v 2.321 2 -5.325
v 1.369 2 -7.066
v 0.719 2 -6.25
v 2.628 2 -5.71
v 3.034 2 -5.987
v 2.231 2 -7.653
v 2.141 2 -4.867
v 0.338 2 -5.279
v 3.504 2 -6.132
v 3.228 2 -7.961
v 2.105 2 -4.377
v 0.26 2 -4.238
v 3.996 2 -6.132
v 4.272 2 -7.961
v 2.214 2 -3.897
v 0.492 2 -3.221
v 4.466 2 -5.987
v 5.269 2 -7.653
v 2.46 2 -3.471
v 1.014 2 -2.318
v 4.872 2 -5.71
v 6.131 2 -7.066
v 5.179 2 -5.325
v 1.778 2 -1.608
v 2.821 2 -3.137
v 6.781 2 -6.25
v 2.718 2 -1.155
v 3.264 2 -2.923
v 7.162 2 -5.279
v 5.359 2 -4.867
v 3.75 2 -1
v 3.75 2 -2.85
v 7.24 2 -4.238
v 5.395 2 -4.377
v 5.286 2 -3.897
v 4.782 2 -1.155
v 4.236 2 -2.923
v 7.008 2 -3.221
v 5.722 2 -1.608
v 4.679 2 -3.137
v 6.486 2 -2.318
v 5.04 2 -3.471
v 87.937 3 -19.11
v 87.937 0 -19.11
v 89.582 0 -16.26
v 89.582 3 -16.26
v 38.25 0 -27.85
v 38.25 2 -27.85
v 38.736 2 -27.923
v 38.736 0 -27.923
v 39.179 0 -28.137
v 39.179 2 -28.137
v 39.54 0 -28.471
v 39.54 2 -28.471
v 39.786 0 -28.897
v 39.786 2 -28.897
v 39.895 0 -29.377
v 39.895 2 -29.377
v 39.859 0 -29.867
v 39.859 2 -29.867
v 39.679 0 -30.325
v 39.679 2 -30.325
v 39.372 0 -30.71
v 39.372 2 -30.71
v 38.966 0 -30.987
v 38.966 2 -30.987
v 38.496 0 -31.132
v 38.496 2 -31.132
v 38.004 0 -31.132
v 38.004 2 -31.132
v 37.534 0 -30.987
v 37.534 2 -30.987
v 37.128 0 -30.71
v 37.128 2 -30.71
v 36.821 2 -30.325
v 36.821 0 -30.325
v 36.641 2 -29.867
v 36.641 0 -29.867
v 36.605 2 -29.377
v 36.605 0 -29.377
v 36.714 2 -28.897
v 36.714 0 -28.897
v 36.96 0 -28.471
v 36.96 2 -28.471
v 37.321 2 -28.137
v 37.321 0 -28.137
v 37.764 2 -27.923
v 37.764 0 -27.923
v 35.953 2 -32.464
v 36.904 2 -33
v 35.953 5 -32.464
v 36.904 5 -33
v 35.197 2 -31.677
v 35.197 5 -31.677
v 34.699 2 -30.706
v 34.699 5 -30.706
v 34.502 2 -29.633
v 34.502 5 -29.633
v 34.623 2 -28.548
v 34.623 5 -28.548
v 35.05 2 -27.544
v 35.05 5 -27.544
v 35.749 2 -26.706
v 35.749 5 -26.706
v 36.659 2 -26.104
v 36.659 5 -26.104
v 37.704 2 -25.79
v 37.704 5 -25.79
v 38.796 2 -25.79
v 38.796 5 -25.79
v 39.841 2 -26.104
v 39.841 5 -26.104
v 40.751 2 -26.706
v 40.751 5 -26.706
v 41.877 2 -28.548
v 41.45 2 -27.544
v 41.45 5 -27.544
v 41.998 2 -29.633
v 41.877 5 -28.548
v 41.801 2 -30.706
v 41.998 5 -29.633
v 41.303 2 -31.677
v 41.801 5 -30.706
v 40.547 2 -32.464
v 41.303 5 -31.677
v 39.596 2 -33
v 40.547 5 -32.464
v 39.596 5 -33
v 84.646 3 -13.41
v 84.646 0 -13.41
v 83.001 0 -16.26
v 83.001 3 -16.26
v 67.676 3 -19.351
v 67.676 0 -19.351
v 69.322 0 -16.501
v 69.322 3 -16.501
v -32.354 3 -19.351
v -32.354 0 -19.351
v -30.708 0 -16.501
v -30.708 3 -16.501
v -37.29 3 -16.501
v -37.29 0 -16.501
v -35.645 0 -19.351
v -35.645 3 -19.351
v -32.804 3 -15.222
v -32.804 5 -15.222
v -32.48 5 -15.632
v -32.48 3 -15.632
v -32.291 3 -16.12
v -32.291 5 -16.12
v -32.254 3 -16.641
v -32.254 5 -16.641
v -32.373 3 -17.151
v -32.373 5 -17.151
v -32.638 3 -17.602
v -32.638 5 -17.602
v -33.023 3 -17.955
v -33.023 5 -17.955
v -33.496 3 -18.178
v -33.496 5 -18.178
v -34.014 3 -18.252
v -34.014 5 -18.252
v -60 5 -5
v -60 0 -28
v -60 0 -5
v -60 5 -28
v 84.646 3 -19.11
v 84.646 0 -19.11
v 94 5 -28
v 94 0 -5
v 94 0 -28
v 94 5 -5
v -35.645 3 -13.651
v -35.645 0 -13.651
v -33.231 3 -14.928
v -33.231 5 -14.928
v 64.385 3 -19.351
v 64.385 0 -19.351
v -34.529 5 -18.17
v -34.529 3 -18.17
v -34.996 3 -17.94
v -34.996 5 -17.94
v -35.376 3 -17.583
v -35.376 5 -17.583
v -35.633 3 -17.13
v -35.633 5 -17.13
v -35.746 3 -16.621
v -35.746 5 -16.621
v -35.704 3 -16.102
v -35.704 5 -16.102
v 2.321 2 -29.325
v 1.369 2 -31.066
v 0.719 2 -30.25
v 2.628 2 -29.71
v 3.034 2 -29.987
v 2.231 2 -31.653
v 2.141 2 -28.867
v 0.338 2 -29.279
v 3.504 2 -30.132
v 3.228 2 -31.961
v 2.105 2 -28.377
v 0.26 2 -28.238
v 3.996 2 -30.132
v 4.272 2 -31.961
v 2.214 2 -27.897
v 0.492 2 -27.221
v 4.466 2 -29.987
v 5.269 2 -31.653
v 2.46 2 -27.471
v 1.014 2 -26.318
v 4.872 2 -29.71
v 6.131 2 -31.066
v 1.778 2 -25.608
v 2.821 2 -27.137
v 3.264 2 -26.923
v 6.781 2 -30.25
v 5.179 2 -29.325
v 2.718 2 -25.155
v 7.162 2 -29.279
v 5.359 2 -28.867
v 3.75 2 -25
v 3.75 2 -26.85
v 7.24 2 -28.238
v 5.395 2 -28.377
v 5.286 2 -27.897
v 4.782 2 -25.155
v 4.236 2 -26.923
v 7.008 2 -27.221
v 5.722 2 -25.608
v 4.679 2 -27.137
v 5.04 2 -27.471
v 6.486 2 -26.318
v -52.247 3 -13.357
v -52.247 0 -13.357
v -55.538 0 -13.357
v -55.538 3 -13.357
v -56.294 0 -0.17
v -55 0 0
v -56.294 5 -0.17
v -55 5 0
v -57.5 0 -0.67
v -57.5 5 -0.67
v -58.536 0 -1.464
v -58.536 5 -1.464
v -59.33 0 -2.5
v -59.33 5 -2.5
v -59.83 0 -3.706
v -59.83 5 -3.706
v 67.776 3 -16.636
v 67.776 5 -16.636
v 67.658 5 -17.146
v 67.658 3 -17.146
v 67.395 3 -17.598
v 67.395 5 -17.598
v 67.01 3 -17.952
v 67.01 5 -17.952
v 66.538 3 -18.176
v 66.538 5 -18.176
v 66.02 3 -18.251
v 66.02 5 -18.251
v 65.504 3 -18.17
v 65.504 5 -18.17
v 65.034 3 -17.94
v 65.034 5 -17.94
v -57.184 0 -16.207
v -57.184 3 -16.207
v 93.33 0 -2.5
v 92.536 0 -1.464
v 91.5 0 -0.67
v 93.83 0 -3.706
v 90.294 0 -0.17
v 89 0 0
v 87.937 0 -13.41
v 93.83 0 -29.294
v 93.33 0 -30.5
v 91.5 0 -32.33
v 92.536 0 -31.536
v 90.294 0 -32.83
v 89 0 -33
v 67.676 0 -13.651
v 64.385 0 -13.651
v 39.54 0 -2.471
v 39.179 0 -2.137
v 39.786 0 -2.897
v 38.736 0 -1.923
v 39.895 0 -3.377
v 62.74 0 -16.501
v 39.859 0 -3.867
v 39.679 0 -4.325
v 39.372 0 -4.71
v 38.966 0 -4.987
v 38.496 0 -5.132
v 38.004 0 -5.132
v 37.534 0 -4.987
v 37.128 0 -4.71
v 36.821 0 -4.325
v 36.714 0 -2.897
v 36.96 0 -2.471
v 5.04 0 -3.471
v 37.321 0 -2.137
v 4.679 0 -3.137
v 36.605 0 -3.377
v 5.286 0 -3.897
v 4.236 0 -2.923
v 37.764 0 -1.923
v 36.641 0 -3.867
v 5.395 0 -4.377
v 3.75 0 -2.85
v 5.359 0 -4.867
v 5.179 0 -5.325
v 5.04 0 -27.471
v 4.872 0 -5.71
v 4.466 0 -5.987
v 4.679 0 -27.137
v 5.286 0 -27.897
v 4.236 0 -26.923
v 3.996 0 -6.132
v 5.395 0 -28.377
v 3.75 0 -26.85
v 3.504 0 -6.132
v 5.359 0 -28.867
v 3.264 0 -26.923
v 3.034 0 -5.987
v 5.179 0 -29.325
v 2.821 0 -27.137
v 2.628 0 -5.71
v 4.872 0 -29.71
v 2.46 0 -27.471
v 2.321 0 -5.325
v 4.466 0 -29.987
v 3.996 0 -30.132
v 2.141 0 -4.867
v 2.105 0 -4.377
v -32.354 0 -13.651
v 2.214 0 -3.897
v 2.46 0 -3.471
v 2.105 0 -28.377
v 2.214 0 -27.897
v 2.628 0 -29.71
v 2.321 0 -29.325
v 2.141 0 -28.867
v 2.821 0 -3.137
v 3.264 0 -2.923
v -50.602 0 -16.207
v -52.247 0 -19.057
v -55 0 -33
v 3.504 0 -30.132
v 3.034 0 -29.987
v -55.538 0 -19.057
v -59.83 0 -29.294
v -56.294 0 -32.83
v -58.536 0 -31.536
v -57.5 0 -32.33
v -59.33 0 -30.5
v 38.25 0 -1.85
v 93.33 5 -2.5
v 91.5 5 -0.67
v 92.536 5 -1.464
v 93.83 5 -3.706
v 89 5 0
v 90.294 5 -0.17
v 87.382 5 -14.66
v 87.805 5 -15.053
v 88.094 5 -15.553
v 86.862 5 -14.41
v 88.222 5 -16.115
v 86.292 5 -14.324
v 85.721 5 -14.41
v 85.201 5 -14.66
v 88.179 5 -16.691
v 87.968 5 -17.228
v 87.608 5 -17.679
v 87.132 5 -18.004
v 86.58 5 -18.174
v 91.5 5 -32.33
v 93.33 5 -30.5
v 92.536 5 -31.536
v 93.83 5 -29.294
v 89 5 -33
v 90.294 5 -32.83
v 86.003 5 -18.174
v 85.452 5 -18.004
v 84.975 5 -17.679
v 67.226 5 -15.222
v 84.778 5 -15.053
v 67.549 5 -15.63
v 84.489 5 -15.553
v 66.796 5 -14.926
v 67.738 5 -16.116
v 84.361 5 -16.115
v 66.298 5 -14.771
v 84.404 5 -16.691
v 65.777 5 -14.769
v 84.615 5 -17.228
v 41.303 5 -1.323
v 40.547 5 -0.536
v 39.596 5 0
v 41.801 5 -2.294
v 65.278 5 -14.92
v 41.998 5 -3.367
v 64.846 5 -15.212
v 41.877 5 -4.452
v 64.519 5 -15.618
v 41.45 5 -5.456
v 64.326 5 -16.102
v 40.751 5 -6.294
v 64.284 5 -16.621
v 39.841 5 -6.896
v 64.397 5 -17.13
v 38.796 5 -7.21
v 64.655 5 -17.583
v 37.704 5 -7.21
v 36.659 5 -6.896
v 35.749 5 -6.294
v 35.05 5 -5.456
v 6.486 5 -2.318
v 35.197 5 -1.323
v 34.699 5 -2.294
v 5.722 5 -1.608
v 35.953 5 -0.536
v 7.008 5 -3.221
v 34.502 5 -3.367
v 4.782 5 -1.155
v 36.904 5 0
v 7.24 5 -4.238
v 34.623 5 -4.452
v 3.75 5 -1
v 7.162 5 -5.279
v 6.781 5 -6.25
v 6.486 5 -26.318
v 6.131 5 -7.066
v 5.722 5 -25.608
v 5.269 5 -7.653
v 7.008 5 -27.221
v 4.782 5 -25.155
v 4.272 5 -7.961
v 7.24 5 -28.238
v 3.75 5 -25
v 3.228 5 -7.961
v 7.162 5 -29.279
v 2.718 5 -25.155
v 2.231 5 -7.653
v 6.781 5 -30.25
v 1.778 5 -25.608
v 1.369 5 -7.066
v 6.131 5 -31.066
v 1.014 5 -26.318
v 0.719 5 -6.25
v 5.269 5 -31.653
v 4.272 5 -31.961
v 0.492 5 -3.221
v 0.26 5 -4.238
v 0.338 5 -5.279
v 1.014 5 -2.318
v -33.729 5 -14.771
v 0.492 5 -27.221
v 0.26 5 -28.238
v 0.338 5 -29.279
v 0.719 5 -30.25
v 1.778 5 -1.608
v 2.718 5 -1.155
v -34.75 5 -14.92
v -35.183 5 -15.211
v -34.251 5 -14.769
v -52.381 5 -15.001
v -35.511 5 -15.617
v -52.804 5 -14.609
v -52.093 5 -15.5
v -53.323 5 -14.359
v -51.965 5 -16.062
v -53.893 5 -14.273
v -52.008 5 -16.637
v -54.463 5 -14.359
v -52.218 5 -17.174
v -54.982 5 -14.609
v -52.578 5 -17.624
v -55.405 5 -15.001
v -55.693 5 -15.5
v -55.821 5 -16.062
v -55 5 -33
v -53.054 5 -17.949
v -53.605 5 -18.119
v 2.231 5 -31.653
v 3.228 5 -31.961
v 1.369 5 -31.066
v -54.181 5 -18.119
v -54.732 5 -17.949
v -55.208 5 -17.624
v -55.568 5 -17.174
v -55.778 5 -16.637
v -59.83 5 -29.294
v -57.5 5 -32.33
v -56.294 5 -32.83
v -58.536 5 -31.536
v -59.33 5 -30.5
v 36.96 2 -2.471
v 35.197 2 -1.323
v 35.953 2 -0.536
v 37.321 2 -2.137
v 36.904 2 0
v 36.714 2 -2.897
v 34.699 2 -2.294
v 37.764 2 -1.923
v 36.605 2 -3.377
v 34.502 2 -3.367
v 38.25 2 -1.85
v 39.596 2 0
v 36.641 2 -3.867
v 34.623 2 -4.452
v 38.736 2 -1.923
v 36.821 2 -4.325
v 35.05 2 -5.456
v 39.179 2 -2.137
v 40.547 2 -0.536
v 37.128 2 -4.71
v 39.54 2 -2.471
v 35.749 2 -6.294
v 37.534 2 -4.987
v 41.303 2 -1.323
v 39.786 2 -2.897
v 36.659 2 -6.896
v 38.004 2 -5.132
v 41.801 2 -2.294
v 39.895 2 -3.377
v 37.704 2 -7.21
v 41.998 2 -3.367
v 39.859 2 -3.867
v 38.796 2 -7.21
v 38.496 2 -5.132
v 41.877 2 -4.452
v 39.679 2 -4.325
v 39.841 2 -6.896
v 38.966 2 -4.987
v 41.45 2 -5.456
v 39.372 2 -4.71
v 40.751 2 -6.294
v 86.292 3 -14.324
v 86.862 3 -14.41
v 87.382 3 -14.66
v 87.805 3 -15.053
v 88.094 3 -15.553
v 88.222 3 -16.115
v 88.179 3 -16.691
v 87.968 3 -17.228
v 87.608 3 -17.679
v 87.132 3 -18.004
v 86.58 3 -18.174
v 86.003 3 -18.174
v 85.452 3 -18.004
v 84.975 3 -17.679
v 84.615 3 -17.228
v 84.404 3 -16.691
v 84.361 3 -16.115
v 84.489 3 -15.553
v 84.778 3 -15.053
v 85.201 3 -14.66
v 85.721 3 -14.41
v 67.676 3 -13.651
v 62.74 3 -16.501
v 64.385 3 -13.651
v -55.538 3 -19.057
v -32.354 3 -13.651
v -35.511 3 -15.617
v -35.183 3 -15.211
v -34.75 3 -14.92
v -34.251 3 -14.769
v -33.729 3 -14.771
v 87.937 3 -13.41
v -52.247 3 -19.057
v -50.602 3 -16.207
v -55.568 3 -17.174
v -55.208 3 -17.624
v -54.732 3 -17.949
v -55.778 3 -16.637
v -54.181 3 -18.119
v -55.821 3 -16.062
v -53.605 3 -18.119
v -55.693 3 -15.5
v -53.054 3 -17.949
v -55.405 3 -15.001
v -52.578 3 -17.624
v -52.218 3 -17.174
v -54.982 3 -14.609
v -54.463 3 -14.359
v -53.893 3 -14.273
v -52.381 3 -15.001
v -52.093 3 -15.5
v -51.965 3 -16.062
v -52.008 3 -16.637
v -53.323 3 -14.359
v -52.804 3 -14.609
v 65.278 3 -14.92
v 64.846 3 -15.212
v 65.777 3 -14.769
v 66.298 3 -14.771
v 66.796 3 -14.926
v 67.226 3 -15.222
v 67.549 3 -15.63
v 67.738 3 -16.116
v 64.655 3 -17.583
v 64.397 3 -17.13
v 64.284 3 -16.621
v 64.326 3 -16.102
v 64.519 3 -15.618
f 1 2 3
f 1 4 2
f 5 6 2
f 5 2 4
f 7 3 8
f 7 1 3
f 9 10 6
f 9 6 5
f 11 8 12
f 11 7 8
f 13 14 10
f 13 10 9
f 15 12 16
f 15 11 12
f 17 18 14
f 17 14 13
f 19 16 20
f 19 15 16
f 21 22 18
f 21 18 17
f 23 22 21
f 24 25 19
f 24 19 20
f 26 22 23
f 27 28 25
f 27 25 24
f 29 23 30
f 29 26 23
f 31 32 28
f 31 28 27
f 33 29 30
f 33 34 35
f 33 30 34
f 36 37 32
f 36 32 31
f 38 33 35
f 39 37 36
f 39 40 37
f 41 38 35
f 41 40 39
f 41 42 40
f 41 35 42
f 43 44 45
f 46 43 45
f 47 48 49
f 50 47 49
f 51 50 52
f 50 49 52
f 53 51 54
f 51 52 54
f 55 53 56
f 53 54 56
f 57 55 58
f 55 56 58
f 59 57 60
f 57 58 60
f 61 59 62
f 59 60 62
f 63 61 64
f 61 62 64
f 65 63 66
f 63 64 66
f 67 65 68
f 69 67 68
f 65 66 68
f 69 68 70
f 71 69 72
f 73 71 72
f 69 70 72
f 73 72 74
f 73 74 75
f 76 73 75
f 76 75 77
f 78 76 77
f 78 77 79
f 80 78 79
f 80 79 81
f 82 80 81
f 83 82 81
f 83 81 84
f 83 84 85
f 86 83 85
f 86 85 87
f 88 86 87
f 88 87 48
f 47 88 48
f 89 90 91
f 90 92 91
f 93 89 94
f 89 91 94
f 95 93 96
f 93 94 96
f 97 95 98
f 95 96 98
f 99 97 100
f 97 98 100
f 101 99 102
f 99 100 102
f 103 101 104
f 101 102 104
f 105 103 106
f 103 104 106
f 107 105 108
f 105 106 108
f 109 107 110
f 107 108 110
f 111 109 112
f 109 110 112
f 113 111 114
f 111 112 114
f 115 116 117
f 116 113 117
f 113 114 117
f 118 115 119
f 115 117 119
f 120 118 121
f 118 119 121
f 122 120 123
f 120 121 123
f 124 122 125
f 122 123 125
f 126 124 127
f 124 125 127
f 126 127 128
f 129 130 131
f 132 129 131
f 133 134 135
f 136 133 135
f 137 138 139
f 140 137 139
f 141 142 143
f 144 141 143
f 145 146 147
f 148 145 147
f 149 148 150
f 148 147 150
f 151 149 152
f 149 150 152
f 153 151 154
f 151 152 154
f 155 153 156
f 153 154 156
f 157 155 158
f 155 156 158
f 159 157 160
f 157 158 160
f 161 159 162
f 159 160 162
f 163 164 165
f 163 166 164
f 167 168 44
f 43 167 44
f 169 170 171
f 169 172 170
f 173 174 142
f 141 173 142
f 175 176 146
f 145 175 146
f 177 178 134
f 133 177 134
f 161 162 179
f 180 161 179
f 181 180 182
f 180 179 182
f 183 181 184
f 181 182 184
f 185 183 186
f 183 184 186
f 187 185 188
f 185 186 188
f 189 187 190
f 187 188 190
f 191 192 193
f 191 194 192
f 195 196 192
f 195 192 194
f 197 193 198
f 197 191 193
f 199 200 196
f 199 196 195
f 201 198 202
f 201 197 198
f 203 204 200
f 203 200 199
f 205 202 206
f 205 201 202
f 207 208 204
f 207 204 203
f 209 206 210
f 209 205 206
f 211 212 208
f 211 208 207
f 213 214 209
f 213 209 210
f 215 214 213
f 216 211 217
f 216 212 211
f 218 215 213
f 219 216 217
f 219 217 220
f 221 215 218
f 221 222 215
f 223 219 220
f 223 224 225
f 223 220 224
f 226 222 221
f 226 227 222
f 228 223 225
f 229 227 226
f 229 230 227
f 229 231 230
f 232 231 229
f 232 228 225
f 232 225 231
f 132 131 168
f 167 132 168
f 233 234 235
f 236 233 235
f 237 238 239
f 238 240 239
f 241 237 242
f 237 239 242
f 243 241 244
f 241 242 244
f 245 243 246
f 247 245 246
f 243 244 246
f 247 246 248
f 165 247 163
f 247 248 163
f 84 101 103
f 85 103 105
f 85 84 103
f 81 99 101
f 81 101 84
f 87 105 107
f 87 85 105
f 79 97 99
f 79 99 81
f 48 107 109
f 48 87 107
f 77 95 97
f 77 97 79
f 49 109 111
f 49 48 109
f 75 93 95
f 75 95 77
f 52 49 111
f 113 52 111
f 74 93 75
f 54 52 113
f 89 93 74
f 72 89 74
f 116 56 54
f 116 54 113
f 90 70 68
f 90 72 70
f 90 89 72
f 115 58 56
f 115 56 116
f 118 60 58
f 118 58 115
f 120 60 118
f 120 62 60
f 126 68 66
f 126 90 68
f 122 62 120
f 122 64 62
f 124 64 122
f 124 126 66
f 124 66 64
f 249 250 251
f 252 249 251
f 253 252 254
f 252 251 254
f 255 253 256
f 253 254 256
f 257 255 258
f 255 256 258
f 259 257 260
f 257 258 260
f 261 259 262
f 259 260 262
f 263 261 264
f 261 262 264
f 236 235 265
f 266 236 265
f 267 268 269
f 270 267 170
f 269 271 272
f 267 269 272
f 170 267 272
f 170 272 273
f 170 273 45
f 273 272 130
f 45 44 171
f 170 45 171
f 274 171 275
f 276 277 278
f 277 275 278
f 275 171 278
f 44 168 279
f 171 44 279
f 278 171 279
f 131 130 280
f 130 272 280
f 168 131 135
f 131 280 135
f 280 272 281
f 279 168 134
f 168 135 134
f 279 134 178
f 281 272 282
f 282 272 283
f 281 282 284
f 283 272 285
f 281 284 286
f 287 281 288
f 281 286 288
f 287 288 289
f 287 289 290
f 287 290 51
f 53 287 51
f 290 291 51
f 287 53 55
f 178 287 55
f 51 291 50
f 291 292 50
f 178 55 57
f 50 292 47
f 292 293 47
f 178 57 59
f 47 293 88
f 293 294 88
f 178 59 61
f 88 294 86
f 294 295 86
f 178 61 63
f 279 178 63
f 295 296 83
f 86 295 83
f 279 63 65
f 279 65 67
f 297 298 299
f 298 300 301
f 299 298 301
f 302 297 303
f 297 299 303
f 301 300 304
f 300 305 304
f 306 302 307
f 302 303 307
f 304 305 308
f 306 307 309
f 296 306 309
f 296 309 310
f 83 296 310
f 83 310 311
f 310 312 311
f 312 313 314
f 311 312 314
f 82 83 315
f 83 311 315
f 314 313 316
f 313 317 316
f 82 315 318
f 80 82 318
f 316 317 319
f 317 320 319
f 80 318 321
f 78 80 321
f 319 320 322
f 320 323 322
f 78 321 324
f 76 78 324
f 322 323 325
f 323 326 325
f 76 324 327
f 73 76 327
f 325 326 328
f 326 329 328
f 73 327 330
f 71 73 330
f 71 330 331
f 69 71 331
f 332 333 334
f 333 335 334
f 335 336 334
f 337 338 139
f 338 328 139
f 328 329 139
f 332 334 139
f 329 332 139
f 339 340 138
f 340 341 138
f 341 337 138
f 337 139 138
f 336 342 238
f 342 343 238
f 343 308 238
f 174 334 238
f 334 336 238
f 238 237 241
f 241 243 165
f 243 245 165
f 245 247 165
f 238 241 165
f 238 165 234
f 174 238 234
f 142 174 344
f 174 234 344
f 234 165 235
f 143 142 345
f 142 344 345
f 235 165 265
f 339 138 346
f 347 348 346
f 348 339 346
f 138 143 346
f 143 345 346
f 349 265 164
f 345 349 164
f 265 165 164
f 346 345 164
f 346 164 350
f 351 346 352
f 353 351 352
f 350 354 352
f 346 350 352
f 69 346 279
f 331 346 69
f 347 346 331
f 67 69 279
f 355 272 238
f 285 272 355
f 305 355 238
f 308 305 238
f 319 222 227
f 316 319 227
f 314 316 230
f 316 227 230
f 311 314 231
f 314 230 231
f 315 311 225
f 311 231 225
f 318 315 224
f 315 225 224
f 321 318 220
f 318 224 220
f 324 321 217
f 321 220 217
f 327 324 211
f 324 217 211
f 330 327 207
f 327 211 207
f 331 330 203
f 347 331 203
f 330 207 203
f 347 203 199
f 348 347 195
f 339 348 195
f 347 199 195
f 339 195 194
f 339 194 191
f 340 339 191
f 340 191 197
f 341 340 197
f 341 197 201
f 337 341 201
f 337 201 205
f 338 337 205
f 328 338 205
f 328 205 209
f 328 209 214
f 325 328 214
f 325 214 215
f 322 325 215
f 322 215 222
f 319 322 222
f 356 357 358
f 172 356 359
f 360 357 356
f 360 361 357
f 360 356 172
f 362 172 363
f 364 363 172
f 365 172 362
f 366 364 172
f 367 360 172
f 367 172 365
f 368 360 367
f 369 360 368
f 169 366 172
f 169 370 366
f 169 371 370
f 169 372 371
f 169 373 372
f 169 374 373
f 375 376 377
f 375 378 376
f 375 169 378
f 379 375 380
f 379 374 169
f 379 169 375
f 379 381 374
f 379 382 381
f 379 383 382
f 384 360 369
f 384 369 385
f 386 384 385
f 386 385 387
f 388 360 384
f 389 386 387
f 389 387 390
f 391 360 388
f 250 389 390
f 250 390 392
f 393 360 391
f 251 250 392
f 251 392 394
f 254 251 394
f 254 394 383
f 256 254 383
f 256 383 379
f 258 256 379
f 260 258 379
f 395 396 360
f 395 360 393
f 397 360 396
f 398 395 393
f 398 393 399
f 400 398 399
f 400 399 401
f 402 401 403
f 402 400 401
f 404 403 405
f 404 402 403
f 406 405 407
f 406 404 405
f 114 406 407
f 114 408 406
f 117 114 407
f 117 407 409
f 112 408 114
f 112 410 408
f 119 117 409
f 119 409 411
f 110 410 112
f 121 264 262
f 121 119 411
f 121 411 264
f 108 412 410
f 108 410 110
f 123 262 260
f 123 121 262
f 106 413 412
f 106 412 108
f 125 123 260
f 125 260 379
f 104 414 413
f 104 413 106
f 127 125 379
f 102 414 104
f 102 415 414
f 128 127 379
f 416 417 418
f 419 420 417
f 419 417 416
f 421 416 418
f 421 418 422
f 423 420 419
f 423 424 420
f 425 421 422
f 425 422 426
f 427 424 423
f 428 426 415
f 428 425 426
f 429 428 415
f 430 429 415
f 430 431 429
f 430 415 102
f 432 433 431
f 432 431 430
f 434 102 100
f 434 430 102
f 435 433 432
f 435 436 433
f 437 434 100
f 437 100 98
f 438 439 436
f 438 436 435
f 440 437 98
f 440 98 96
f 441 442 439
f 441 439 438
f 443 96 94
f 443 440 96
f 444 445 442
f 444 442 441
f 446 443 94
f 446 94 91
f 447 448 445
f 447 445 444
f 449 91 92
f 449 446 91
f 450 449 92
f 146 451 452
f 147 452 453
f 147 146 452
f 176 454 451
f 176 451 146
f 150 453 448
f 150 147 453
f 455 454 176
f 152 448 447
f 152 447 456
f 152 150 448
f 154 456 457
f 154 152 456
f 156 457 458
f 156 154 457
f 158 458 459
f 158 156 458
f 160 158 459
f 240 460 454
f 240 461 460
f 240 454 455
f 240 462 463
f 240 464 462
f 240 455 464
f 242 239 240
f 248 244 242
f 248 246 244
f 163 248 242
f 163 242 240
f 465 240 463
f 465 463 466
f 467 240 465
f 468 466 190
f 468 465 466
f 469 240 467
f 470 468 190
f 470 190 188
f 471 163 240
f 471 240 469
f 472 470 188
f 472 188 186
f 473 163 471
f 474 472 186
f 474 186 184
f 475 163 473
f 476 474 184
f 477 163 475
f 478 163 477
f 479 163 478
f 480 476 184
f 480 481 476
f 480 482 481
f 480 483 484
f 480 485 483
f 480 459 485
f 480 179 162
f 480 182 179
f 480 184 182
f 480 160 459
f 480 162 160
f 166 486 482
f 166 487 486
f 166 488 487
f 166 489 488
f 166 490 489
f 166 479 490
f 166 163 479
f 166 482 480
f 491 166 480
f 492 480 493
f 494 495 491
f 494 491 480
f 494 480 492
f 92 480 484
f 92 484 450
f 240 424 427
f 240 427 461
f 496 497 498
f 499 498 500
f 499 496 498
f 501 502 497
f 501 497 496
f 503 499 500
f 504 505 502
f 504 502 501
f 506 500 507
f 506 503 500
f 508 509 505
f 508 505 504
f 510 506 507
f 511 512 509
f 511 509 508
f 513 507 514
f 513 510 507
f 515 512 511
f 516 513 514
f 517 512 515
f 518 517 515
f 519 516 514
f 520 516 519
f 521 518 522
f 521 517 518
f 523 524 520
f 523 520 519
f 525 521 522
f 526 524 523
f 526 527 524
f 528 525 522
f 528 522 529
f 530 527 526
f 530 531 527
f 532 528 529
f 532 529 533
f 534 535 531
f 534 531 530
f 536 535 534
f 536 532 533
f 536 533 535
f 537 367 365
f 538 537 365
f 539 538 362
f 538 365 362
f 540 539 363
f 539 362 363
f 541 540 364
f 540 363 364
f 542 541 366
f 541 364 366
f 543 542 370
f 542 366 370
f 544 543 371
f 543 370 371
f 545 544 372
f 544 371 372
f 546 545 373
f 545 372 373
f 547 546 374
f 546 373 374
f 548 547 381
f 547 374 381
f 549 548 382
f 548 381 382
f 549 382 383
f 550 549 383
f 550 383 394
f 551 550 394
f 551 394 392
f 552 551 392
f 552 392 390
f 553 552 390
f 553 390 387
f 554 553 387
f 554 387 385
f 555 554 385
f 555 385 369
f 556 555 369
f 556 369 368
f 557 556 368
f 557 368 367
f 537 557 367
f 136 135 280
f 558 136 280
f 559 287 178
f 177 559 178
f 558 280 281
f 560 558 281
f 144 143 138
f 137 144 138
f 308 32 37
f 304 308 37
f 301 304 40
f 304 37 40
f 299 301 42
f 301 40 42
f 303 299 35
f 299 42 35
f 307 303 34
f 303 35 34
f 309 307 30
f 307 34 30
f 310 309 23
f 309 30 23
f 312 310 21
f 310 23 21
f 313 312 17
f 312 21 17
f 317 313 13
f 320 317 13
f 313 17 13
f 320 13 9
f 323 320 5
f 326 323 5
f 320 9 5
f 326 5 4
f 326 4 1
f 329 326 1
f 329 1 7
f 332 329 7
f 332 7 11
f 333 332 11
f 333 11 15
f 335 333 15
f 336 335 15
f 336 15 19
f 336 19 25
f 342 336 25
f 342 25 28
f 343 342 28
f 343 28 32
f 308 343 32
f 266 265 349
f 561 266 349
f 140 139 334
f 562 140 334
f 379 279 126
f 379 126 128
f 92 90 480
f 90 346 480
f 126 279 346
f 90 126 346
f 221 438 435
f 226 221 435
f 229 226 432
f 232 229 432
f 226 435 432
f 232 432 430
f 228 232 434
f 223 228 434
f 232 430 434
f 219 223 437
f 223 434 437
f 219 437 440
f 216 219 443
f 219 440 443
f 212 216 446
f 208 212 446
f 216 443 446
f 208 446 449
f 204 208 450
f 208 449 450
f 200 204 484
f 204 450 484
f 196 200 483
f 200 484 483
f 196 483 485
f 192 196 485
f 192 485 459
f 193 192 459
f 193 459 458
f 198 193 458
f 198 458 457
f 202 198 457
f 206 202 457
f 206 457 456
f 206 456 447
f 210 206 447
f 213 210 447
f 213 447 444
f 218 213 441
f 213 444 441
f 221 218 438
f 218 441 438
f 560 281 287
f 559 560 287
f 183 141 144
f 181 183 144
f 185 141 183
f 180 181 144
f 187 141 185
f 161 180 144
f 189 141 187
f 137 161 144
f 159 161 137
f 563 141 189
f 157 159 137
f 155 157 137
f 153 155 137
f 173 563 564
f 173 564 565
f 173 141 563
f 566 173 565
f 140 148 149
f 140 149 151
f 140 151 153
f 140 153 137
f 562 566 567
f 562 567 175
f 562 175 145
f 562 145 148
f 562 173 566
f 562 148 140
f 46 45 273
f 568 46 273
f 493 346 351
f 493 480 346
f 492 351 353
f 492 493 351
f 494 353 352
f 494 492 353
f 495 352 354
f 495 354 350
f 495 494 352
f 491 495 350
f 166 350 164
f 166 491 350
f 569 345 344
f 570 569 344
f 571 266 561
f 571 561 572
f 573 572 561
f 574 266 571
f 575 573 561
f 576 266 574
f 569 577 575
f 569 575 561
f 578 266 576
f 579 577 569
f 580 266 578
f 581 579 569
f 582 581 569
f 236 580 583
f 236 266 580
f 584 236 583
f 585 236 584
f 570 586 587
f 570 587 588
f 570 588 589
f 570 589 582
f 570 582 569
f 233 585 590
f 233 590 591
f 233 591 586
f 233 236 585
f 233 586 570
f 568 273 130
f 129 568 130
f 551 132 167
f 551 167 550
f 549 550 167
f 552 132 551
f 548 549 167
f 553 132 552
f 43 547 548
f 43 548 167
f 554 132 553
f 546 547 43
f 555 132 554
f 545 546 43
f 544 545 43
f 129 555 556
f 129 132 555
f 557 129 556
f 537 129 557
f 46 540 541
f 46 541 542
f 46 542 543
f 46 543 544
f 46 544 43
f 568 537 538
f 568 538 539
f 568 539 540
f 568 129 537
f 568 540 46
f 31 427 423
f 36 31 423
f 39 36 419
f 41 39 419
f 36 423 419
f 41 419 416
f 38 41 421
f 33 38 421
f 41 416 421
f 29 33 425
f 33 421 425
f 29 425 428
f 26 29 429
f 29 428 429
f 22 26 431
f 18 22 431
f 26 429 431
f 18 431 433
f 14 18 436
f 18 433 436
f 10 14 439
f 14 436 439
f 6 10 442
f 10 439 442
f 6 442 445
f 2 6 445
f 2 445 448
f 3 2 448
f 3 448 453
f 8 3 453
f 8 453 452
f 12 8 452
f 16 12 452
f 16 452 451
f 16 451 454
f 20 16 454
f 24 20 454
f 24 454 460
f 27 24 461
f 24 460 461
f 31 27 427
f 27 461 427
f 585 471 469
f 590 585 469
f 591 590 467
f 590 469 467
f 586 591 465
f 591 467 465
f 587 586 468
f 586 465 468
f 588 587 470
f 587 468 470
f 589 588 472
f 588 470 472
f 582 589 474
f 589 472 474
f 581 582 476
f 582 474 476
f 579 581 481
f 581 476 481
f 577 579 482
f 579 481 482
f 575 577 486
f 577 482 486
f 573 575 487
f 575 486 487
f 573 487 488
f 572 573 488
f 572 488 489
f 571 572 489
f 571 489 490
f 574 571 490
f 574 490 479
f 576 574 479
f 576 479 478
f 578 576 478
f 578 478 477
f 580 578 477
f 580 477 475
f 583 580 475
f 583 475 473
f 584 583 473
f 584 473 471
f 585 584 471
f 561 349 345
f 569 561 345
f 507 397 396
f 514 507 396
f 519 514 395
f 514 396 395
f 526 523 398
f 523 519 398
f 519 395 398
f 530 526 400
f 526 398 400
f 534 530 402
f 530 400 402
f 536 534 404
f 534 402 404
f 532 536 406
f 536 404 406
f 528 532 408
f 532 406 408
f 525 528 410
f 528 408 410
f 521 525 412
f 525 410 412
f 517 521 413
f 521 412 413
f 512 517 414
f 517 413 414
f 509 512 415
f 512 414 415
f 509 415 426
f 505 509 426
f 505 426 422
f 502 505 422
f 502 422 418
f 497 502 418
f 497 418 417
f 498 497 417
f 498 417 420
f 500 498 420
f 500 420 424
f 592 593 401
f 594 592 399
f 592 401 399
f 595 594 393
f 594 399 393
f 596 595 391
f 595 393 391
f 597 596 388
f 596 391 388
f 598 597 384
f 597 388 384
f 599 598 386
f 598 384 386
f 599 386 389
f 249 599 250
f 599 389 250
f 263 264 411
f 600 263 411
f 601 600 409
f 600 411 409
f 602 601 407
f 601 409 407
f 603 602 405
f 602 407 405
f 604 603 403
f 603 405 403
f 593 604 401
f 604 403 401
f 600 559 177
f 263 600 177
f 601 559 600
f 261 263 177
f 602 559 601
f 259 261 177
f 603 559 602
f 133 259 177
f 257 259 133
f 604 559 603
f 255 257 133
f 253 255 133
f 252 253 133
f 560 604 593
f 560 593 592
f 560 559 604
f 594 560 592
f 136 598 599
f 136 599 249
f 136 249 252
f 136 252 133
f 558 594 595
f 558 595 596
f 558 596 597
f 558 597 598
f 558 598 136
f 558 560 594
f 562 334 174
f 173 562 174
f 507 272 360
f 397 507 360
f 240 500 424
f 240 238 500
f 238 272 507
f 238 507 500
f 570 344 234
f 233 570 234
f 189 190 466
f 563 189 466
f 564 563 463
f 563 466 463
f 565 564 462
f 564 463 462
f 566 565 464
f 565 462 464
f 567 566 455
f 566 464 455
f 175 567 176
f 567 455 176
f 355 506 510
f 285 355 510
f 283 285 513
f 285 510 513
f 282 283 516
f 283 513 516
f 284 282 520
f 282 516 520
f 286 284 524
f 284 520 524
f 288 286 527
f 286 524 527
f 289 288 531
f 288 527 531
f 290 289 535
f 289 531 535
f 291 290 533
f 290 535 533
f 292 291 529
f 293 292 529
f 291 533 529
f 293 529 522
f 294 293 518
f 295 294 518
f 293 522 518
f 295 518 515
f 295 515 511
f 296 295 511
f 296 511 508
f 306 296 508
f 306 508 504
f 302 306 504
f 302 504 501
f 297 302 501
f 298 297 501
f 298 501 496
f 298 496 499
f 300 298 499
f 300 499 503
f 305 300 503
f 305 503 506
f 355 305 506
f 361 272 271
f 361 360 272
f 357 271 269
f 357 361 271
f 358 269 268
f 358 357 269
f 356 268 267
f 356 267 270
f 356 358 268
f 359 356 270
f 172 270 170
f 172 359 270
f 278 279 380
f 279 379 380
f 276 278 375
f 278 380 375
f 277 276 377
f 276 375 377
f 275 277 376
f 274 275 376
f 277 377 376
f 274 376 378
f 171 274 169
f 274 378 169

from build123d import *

# Parameters (mm, degrees)
SKETCH1_W           = 42
SKETCH1_H           = 33
BOSS_EXTRUDE1_DEPTH = 5
SKETCH2_W           = 33
SKETCH2_H           = 5
BOSS_EXTRUDE2_DEPTH = 60
SKETCH3_W           = 33
SKETCH3_H           = 5
BOSS_EXTRUDE3_DEPTH = 52
FILLET1_R           = 5
SKETCH6_R           = 1.933769561
SKETCH6_R_2         = 1.936009006
CUT_EXTRUDE1_DEPTH  = 55
SKETCH7_R           = 3.5
SKETCH7_R_2         = 1.65
SKETCH7_R_3         = 3.75
CUT_EXTRUDE6_DEPTH  = 3
SKETCH8_R           = 1.65
CUT_EXTRUDE7_DEPTH  = 9
CUT_EXTRUDE8_DEPTH  = 3


with BuildPart() as part:
    # Sketch1 → Boss-Extrude1 (new body)
    with BuildSketch(Plane(origin=(0, 0, 0), x_dir=(1, 0, 0), z_dir=(0, 1, 0))):
        with Locations((21, 16.5)):
            Rectangle(SKETCH1_W, SKETCH1_H)
    extrude(amount=BOSS_EXTRUDE1_DEPTH)

    # Sketch2 → Boss-Extrude2 (add)
    with BuildSketch(Plane.ZY):
        with Locations((-16.5, 2.5)):
            Rectangle(SKETCH2_W, SKETCH2_H)
    extrude(amount=BOSS_EXTRUDE2_DEPTH)

    # Sketch3 → Boss-Extrude3 (add)
    with BuildSketch(Plane(origin=(42, 0, 0), x_dir=(0, 0, -1), z_dir=(1, 0, 0))):
        with Locations((16.5, 2.5)):
            Rectangle(SKETCH3_W, SKETCH3_H)
    extrude(amount=BOSS_EXTRUDE3_DEPTH)

    # Fillet1
    fillet1_edges = [part.edges().sort_by_distance(p)[0] for p in [
        (-60, 2.5, -33),
        (94, 2.5, -33),
        (94, 2.5, 0),
        (-60, 2.5, 0),
    ]]
    fillet(fillet1_edges, radius=FILLET1_R)

    # Sketch6 → Cut-Extrude1 (cut)
    with BuildSketch(Plane(origin=(0, 5, 0), x_dir=(1, 0, 0), z_dir=(0, 1, 0))):
        with Locations((-53.892928071, 16.206648626)):
            Circle(SKETCH6_R)
        with BuildLine():
            Line((-33.231112903, 14.928003086), (-32.804010339, 15.222003341))
            ThreePointArc((-32.804010339, 15.222003341), (-32.373392107, 17.150567334), (-34.01401443, 18.251998007))
            ThreePointArc((-34.01401443, 18.251998007), (-35.37580525, 17.583221312), (-35.704007275, 16.101998866))
            ThreePointArc((-35.704007275, 16.101998866), (-34.750203351, 14.919643697), (-33.231112903, 14.928003086))
        make_face()
        with BuildLine():
            ThreePointArc((64.846014701, 15.211997211), (66.795875027, 14.926365069), (67.776015126, 16.636004329))
            ThreePointArc((67.776015126, 16.636004329), (66.782491719, 18.081747119), (65.034015201, 17.940004945))
            ThreePointArc((65.034015201, 17.940004945), (64.284233669, 16.621194208), (64.846014701, 15.211997211))
        make_face()
        with Locations((86.291564463, 16.259906017)):
            Circle(SKETCH6_R_2)
    extrude(amount=-CUT_EXTRUDE1_DEPTH, mode=Mode.SUBTRACT)

    # Sketch7 → Cut-Extrude6 (cut)
    # profile 1 of 4: a face of its own
    with BuildSketch(Plane(origin=(0, 5, 0), x_dir=(1, 0, 0), z_dir=(0, 1, 0))):
        with Locations((3.750000566, 28.5)):
            Circle(SKETCH7_R)
        with Locations((3.750000566, 28.5)):
            Circle(SKETCH7_R_2, mode=Mode.SUBTRACT)
    # profile 2 of 4: a face of its own
    with BuildSketch(Plane(origin=(0, 5, 0), x_dir=(1, 0, 0), z_dir=(0, 1, 0))):
        with Locations((3.750000566, 4.500000179)):
            Circle(SKETCH7_R)
        with Locations((3.750000566, 4.500000179)):
            Circle(SKETCH7_R_2, mode=Mode.SUBTRACT)
    # profile 3 of 4: a face of its own
    with BuildSketch(Plane(origin=(0, 5, 0), x_dir=(1, 0, 0), z_dir=(0, 1, 0))):
        with Locations((38.25, 3.500000179)):
            Circle(SKETCH7_R_3)
        with Locations((38.25, 3.500000179)):
            Circle(SKETCH7_R_2, mode=Mode.SUBTRACT)
    # profile 4 of 4: a face of its own
    with BuildSketch(Plane(origin=(0, 5, 0), x_dir=(1, 0, 0), z_dir=(0, 1, 0))):
        with Locations((38.25, 29.5)):
            Circle(SKETCH7_R_3)
        with Locations((38.25, 29.5)):
            Circle(SKETCH7_R_2, mode=Mode.SUBTRACT)
    extrude(amount=-CUT_EXTRUDE6_DEPTH, mode=Mode.SUBTRACT)

    # Sketch8 → Cut-Extrude7 (cut)
    with BuildSketch(Plane(origin=(0, 5, 0), x_dir=(1, 0, 0), z_dir=(0, 1, 0))):
        with Locations((38.25, 3.500000179)):
            Circle(SKETCH8_R)
        with Locations((3.750000566, 28.5)):
            Circle(SKETCH8_R)
        with Locations((3.750000566, 4.500000179)):
            Circle(SKETCH8_R)
        with Locations((38.25, 29.5)):
            Circle(SKETCH8_R)
    extrude(amount=-CUT_EXTRUDE7_DEPTH, mode=Mode.SUBTRACT)

    # Sketch9 → Cut-Extrude8 (cut)
    with BuildSketch(Plane.XZ):
        Polygon((-50.602031537, -16.206648626), (-52.247479804, -13.356648626), (-55.538376338, -13.356648626), (-57.183824606, -16.206648626), (-55.538376338, -19.056648626), (-52.247479804, -19.056648626), align=None)
        Polygon((-30.708442047, -16.501258638), (-32.353890314, -13.651258638), (-35.644786848, -13.651258638), (-37.290235116, -16.501258638), (-35.644786848, -19.351258638), (-32.353890314, -19.351258638), align=None)
        Polygon((69.321562817, -16.500838902), (67.67611455, -13.650838902), (64.385218016, -13.650838902), (62.739769748, -16.500838902), (64.385218016, -19.350838902), (67.67611455, -19.350838902), align=None)
        Polygon((89.582460998, -16.259906017), (87.93701273, -13.409906017), (84.646116196, -13.409906017), (83.000667929, -16.259906017), (84.646116196, -19.109906017), (87.93701273, -19.109906017), align=None)
    extrude(amount=-CUT_EXTRUDE8_DEPTH, mode=Mode.SUBTRACT)


solid = part.part
